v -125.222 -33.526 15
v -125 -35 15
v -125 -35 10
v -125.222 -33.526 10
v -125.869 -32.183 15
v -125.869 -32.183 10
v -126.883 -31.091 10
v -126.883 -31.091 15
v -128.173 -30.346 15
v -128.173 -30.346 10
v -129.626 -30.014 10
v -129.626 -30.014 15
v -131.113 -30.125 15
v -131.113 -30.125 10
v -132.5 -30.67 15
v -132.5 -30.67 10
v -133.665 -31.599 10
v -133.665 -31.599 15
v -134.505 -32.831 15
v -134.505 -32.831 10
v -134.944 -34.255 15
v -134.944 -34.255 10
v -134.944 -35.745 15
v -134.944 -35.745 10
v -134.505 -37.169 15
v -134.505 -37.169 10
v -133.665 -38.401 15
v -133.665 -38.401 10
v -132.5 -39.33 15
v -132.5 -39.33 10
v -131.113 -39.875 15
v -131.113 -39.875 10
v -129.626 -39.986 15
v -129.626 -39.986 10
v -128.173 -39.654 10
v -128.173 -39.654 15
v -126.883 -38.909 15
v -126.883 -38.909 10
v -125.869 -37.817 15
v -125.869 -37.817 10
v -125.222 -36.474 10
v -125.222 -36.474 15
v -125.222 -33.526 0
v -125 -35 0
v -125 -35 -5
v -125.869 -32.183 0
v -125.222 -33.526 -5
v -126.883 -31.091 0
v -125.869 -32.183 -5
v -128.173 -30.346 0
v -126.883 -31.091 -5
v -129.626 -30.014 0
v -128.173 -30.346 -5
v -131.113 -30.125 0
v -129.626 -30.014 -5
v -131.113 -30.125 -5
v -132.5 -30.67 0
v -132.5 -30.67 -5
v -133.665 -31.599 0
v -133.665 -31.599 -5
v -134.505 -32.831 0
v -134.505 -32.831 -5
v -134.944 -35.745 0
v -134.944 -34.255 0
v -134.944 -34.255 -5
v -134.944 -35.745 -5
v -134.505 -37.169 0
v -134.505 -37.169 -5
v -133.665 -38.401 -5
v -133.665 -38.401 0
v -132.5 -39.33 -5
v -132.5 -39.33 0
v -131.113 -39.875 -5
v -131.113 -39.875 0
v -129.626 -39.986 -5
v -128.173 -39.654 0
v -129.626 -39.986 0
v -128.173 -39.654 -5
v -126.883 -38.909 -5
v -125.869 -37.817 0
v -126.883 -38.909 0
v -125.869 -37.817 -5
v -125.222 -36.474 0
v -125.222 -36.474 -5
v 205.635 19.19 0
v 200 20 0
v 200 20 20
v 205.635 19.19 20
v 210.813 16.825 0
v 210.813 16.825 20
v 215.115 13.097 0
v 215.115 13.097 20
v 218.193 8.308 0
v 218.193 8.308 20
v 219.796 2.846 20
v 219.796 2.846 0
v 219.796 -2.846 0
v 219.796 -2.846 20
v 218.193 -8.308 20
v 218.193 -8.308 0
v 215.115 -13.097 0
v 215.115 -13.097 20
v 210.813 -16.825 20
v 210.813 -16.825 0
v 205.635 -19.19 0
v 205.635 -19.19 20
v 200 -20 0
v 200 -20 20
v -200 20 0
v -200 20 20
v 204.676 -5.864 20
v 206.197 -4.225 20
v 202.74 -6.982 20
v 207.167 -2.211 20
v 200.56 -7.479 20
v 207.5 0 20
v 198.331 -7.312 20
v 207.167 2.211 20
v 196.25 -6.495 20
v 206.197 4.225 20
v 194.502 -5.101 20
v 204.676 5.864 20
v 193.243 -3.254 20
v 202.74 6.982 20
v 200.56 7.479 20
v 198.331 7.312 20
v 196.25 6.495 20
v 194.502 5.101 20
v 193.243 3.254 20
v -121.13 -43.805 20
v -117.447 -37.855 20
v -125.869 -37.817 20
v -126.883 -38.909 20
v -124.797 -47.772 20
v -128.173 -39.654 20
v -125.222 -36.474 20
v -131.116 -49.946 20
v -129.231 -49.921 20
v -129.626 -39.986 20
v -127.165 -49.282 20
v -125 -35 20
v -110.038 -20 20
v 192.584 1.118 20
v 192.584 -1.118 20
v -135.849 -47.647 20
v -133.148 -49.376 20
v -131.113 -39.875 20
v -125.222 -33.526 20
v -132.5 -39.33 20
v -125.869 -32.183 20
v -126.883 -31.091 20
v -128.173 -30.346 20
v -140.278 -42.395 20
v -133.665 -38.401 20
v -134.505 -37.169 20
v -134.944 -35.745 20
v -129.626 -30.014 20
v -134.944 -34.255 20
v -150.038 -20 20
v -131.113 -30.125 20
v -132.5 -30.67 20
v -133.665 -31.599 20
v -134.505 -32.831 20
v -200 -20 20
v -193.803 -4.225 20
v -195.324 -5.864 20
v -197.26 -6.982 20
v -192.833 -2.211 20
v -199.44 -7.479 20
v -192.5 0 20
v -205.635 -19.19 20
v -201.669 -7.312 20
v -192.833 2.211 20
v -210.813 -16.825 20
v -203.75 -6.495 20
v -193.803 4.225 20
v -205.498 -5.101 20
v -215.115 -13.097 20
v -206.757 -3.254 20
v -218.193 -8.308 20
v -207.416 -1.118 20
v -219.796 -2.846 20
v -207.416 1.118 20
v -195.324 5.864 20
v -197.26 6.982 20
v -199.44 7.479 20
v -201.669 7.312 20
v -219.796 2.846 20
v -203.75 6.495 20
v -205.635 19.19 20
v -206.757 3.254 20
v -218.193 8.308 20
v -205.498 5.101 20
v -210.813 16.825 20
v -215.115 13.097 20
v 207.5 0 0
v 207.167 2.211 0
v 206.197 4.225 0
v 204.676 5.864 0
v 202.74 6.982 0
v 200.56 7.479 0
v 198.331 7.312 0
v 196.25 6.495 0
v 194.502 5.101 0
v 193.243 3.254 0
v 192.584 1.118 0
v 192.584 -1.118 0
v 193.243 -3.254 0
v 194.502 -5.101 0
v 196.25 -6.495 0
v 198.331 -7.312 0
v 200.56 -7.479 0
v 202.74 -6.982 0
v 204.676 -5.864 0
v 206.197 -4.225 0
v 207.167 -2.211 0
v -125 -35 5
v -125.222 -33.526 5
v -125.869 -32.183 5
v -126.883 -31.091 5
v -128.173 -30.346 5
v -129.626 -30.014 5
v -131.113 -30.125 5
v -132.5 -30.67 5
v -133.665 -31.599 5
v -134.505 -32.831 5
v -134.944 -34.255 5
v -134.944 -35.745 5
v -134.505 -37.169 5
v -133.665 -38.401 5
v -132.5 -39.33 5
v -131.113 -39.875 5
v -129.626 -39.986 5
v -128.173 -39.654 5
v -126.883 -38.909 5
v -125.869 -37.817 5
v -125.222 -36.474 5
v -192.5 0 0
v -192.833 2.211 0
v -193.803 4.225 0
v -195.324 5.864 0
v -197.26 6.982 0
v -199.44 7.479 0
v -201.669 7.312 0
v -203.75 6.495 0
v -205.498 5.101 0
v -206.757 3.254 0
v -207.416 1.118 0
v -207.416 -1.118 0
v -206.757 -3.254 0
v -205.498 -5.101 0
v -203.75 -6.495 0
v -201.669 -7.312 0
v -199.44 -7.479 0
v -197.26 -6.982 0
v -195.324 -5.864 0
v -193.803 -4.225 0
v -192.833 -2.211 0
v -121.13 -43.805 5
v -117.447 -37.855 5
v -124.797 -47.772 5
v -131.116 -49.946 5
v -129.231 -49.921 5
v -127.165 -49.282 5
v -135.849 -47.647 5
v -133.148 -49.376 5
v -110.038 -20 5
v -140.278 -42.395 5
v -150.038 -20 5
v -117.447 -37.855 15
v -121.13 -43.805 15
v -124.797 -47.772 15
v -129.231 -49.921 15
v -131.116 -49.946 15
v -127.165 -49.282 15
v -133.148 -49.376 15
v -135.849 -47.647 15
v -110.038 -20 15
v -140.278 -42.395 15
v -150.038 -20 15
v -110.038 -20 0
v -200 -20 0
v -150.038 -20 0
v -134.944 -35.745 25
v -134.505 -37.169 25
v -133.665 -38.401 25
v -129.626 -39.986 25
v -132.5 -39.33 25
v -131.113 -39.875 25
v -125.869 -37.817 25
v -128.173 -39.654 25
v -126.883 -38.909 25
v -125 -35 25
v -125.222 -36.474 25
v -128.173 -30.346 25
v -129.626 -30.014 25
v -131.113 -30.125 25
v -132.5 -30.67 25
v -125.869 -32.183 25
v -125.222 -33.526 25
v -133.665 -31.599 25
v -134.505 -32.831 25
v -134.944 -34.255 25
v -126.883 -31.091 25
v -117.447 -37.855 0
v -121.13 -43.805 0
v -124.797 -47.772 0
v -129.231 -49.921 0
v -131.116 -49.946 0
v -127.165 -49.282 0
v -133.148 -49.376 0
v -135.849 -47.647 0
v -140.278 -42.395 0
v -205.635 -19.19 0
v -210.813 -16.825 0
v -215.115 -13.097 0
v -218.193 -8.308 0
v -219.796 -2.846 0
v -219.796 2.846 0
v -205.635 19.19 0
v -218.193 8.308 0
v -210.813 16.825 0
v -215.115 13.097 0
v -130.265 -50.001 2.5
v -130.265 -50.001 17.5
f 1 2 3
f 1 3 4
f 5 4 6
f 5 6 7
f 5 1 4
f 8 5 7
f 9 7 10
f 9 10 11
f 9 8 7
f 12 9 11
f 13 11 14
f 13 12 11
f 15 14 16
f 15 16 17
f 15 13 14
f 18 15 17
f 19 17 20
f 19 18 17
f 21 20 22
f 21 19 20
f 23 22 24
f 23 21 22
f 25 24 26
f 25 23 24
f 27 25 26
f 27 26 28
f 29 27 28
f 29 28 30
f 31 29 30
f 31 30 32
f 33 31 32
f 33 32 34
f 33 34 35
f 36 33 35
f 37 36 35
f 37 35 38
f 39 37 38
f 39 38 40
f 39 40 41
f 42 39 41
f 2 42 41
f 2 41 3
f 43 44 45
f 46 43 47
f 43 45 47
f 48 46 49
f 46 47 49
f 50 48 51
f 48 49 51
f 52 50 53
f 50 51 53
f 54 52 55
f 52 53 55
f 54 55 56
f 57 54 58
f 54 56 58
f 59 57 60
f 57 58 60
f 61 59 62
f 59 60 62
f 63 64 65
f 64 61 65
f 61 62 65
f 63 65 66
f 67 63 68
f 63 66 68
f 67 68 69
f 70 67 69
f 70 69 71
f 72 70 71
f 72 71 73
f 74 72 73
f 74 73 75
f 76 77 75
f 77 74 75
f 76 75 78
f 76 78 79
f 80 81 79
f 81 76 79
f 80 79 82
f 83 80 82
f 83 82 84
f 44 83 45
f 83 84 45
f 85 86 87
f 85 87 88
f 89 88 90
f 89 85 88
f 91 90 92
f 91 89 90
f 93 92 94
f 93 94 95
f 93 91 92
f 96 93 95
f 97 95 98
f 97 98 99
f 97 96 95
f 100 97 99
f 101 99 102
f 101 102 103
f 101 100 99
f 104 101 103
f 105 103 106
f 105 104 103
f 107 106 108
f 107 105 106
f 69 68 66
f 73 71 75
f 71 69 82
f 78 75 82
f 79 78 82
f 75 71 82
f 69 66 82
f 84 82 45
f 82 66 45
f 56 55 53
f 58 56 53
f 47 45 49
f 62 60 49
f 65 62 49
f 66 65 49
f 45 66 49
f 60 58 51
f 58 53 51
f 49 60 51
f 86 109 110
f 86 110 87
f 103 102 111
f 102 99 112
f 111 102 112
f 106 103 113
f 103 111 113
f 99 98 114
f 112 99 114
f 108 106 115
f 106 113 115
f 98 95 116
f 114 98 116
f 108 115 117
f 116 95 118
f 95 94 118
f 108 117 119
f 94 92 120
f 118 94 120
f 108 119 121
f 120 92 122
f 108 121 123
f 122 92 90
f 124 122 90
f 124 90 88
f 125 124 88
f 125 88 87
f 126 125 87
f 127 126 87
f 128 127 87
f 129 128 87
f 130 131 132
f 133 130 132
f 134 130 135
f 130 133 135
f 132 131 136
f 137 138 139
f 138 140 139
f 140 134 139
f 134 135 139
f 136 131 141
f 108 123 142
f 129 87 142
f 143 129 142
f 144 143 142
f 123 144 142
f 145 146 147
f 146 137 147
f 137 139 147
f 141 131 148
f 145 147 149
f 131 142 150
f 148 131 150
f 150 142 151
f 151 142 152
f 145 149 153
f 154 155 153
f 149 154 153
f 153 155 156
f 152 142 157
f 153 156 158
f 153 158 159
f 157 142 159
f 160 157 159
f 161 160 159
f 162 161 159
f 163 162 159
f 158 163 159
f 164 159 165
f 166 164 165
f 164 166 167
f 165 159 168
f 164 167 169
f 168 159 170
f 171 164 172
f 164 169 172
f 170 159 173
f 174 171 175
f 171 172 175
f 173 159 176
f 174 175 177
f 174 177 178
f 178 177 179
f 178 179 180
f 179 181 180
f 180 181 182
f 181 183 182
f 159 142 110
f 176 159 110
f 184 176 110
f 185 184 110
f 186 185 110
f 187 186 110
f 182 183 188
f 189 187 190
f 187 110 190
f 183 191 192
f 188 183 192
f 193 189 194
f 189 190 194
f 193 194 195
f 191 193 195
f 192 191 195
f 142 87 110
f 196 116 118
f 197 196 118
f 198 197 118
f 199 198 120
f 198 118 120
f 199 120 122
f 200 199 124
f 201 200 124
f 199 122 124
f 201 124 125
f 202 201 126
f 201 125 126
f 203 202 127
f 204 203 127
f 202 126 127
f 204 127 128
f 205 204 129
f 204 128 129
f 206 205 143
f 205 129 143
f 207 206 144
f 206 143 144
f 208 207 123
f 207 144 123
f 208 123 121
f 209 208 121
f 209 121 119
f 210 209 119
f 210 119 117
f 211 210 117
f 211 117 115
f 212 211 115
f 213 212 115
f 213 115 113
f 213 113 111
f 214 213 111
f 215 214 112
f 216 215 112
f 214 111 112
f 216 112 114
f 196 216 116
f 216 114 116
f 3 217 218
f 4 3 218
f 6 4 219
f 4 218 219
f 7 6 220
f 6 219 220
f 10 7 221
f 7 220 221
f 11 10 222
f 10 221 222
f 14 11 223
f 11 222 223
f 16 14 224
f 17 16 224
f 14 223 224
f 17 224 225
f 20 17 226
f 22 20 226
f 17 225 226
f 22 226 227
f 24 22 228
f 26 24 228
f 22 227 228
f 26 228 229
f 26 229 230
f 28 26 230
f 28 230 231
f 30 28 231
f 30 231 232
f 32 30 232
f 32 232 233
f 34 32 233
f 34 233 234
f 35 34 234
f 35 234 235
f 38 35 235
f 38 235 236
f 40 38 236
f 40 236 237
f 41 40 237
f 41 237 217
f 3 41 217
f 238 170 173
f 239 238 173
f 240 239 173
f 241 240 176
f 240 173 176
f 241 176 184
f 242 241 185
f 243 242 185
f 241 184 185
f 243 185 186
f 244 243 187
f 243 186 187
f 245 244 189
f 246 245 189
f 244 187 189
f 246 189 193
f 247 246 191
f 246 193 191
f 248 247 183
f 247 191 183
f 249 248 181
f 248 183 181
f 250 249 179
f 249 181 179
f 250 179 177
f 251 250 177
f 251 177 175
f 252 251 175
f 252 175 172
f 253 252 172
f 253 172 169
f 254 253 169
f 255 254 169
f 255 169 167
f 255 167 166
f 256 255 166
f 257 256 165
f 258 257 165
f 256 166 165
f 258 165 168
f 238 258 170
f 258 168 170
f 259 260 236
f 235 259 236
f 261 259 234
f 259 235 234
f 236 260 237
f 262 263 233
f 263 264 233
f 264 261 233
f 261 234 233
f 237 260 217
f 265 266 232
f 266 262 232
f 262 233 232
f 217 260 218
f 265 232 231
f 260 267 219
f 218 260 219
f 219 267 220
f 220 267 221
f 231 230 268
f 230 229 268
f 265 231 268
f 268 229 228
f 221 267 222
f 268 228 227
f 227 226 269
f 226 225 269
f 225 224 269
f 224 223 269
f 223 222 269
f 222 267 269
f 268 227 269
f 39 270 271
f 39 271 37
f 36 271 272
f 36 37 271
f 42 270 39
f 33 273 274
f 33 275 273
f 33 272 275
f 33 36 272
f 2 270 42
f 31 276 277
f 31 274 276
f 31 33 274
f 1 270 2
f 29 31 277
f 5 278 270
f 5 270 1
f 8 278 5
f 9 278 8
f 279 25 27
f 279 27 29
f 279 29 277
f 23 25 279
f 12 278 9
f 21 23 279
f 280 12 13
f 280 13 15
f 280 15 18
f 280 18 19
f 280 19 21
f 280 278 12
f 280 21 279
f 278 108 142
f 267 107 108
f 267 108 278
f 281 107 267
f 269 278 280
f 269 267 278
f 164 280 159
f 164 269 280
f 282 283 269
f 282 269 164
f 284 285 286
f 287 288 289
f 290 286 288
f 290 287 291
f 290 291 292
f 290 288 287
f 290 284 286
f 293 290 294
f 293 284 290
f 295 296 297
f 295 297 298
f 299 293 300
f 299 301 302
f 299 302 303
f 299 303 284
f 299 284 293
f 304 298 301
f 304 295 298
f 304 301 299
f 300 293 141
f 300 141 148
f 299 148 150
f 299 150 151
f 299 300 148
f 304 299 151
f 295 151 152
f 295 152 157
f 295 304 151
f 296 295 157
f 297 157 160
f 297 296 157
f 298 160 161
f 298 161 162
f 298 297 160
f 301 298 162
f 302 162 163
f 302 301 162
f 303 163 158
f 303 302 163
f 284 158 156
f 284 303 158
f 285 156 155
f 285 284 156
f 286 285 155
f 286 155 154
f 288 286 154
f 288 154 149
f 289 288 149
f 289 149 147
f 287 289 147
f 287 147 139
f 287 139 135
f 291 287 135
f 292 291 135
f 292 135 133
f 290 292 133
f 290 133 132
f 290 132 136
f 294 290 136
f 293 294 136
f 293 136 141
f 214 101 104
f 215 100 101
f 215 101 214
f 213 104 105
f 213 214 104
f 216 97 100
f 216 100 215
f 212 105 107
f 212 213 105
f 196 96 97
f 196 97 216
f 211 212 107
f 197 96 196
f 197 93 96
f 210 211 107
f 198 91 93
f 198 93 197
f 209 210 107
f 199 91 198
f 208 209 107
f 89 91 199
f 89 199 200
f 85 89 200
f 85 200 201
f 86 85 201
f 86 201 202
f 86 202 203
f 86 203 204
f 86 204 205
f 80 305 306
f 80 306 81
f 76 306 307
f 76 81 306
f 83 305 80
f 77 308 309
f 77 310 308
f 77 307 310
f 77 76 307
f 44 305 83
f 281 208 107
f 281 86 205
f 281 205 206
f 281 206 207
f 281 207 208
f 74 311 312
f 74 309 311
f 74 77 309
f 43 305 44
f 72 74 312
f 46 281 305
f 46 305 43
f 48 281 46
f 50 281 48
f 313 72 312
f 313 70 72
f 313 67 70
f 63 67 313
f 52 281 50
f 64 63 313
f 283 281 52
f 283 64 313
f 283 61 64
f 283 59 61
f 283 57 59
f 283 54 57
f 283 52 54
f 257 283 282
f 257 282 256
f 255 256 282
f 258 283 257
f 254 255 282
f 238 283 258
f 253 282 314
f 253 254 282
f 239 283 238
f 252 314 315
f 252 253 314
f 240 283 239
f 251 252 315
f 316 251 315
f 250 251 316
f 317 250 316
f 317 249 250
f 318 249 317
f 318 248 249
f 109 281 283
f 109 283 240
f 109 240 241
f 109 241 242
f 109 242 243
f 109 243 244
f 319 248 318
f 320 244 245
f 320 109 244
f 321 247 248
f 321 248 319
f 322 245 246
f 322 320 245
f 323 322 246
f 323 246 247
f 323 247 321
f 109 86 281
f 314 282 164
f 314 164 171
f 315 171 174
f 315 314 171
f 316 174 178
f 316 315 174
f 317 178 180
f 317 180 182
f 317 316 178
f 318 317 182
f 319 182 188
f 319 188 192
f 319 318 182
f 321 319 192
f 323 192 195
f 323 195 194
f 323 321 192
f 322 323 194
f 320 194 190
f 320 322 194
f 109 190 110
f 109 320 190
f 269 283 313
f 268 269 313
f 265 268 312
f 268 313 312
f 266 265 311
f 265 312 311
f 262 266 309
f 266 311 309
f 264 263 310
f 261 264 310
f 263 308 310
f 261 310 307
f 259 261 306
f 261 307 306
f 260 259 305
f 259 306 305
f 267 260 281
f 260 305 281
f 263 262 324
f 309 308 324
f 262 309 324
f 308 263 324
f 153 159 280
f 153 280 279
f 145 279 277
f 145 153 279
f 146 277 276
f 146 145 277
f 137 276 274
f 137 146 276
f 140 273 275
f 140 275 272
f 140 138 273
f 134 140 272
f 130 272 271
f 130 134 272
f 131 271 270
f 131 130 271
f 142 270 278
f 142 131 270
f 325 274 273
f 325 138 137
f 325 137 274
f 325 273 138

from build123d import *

# Parameters (mm, degrees)
BOSS_EXTRUDE1_DEPTH = 20
SKETCH4_R           = 7.5
CUT_EXTRUDE1_DEPTH  = 20
BOSS_EXTRUDE2_DEPTH = 5
BOSS_EXTRUDE3_START = -5
SKETCH9_R           = 5
BOSS_EXTRUDE3_DEPTH = 15


with BuildPart() as part:
    # Sketch2 → Boss-Extrude1 (new body)
    with BuildSketch(Plane.XY):
        with BuildLine():
            Line((-200, 20), (200, 20))
            ThreePointArc((200, 20), (220, 0), (200, -20))
            Line((200, -20), (-200, -20))
            ThreePointArc((-200, -20), (-220, 0), (-200, 20))
        make_face()
    extrude(amount=BOSS_EXTRUDE1_DEPTH)

    # Sketch4 → Cut-Extrude1 (cut)
    with BuildSketch(Plane.XY.offset(20)):
        with Locations((-200, 0)):
            Circle(SKETCH4_R)
        with Locations((200, 0)):
            Circle(SKETCH4_R)
    extrude(amount=-CUT_EXTRUDE1_DEPTH, mode=Mode.SUBTRACT)

    # Sketch8 → Boss-Extrude2 (add)
    with BuildSketch(Plane.XY):
        with BuildLine():
            Line((-150.037555006, -20), (-110.037555006, -20))
            add(Edge.make_bspline(
                [(-150.037555006, -20), (-130.493208153, -80.001537629), (-110.037555006, -20)],
                knots=[0, 0, 0, 1, 1, 1], degree=2))
        make_face()
    boss_extrude2 = extrude(amount=BOSS_EXTRUDE2_DEPTH)

    # Sketch9 → Boss-Extrude3 (add)
    with BuildSketch(Plane.XY.offset(BOSS_EXTRUDE3_START)):
        with Locations((-130, -35)):
            Circle(SKETCH9_R)
    boss_extrude3 = extrude(amount=BOSS_EXTRUDE3_DEPTH)

    # Mirror2: Boss-Extrude2, Boss-Extrude3 across plane
    add(boss_extrude2.mirror(Plane.XY.offset(10)))
    add(boss_extrude3.mirror(Plane.XY.offset(10)))


solid = part.part
